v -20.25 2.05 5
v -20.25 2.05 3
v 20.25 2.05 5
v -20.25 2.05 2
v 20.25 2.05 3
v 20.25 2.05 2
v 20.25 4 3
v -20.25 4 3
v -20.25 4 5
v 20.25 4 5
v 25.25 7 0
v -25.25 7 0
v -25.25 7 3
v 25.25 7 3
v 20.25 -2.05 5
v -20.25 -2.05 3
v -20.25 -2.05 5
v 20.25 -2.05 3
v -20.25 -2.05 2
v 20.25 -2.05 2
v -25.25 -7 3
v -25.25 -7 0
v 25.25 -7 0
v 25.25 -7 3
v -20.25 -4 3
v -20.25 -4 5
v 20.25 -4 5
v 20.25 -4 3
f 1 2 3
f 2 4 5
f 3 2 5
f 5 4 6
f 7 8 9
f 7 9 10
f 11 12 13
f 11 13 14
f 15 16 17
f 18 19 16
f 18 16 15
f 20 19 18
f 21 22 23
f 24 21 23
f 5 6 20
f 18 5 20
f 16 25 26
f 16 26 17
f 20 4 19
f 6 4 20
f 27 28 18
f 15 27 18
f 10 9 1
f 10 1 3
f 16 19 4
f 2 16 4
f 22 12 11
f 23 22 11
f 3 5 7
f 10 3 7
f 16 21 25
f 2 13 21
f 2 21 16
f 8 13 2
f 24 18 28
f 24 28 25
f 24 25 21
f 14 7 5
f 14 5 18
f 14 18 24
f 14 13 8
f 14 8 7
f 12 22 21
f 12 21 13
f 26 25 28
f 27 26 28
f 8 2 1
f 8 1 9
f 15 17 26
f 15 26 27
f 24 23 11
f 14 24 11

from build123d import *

# Parameters (mm, degrees)
F0_W     = 40.5
F0_H     = 4.1
F1_DEPTH = 2
F0_H_2   = 1.95
F2_DEPTH = 5
F0_W_2   = 50.5
F0_H_3   = 14
F3_DEPTH = 3


with BuildPart() as f1:
    # F0 (on Top) → F1 (new body)
    with BuildSketch(Plane.XY):
        Rectangle(F0_W, F0_H)
    extrude(amount=F1_DEPTH)

    # F0 (on Top) → F2 (join)
    with BuildSketch(Plane.XY):
        with Locations((0, 3.025)):
            Rectangle(F0_W, F0_H_2)
        with Locations((0, -3.025)):
            Rectangle(F0_W, F0_H_2)
    extrude(amount=F2_DEPTH)

    # F0 (on Top) → F3 (join)
    with BuildSketch(Plane.XY):
        Rectangle(F0_W_2, F0_H_3)
        Polygon((-20.25, 2.05), (-20.25, 4), (20.25, 4), (20.25, 2.05), (20.25, -2.05), (20.25, -4), (-20.25, -4), (-20.25, -2.05), align=None, mode=Mode.SUBTRACT)
    extrude(amount=F3_DEPTH)


solid = f1.part
